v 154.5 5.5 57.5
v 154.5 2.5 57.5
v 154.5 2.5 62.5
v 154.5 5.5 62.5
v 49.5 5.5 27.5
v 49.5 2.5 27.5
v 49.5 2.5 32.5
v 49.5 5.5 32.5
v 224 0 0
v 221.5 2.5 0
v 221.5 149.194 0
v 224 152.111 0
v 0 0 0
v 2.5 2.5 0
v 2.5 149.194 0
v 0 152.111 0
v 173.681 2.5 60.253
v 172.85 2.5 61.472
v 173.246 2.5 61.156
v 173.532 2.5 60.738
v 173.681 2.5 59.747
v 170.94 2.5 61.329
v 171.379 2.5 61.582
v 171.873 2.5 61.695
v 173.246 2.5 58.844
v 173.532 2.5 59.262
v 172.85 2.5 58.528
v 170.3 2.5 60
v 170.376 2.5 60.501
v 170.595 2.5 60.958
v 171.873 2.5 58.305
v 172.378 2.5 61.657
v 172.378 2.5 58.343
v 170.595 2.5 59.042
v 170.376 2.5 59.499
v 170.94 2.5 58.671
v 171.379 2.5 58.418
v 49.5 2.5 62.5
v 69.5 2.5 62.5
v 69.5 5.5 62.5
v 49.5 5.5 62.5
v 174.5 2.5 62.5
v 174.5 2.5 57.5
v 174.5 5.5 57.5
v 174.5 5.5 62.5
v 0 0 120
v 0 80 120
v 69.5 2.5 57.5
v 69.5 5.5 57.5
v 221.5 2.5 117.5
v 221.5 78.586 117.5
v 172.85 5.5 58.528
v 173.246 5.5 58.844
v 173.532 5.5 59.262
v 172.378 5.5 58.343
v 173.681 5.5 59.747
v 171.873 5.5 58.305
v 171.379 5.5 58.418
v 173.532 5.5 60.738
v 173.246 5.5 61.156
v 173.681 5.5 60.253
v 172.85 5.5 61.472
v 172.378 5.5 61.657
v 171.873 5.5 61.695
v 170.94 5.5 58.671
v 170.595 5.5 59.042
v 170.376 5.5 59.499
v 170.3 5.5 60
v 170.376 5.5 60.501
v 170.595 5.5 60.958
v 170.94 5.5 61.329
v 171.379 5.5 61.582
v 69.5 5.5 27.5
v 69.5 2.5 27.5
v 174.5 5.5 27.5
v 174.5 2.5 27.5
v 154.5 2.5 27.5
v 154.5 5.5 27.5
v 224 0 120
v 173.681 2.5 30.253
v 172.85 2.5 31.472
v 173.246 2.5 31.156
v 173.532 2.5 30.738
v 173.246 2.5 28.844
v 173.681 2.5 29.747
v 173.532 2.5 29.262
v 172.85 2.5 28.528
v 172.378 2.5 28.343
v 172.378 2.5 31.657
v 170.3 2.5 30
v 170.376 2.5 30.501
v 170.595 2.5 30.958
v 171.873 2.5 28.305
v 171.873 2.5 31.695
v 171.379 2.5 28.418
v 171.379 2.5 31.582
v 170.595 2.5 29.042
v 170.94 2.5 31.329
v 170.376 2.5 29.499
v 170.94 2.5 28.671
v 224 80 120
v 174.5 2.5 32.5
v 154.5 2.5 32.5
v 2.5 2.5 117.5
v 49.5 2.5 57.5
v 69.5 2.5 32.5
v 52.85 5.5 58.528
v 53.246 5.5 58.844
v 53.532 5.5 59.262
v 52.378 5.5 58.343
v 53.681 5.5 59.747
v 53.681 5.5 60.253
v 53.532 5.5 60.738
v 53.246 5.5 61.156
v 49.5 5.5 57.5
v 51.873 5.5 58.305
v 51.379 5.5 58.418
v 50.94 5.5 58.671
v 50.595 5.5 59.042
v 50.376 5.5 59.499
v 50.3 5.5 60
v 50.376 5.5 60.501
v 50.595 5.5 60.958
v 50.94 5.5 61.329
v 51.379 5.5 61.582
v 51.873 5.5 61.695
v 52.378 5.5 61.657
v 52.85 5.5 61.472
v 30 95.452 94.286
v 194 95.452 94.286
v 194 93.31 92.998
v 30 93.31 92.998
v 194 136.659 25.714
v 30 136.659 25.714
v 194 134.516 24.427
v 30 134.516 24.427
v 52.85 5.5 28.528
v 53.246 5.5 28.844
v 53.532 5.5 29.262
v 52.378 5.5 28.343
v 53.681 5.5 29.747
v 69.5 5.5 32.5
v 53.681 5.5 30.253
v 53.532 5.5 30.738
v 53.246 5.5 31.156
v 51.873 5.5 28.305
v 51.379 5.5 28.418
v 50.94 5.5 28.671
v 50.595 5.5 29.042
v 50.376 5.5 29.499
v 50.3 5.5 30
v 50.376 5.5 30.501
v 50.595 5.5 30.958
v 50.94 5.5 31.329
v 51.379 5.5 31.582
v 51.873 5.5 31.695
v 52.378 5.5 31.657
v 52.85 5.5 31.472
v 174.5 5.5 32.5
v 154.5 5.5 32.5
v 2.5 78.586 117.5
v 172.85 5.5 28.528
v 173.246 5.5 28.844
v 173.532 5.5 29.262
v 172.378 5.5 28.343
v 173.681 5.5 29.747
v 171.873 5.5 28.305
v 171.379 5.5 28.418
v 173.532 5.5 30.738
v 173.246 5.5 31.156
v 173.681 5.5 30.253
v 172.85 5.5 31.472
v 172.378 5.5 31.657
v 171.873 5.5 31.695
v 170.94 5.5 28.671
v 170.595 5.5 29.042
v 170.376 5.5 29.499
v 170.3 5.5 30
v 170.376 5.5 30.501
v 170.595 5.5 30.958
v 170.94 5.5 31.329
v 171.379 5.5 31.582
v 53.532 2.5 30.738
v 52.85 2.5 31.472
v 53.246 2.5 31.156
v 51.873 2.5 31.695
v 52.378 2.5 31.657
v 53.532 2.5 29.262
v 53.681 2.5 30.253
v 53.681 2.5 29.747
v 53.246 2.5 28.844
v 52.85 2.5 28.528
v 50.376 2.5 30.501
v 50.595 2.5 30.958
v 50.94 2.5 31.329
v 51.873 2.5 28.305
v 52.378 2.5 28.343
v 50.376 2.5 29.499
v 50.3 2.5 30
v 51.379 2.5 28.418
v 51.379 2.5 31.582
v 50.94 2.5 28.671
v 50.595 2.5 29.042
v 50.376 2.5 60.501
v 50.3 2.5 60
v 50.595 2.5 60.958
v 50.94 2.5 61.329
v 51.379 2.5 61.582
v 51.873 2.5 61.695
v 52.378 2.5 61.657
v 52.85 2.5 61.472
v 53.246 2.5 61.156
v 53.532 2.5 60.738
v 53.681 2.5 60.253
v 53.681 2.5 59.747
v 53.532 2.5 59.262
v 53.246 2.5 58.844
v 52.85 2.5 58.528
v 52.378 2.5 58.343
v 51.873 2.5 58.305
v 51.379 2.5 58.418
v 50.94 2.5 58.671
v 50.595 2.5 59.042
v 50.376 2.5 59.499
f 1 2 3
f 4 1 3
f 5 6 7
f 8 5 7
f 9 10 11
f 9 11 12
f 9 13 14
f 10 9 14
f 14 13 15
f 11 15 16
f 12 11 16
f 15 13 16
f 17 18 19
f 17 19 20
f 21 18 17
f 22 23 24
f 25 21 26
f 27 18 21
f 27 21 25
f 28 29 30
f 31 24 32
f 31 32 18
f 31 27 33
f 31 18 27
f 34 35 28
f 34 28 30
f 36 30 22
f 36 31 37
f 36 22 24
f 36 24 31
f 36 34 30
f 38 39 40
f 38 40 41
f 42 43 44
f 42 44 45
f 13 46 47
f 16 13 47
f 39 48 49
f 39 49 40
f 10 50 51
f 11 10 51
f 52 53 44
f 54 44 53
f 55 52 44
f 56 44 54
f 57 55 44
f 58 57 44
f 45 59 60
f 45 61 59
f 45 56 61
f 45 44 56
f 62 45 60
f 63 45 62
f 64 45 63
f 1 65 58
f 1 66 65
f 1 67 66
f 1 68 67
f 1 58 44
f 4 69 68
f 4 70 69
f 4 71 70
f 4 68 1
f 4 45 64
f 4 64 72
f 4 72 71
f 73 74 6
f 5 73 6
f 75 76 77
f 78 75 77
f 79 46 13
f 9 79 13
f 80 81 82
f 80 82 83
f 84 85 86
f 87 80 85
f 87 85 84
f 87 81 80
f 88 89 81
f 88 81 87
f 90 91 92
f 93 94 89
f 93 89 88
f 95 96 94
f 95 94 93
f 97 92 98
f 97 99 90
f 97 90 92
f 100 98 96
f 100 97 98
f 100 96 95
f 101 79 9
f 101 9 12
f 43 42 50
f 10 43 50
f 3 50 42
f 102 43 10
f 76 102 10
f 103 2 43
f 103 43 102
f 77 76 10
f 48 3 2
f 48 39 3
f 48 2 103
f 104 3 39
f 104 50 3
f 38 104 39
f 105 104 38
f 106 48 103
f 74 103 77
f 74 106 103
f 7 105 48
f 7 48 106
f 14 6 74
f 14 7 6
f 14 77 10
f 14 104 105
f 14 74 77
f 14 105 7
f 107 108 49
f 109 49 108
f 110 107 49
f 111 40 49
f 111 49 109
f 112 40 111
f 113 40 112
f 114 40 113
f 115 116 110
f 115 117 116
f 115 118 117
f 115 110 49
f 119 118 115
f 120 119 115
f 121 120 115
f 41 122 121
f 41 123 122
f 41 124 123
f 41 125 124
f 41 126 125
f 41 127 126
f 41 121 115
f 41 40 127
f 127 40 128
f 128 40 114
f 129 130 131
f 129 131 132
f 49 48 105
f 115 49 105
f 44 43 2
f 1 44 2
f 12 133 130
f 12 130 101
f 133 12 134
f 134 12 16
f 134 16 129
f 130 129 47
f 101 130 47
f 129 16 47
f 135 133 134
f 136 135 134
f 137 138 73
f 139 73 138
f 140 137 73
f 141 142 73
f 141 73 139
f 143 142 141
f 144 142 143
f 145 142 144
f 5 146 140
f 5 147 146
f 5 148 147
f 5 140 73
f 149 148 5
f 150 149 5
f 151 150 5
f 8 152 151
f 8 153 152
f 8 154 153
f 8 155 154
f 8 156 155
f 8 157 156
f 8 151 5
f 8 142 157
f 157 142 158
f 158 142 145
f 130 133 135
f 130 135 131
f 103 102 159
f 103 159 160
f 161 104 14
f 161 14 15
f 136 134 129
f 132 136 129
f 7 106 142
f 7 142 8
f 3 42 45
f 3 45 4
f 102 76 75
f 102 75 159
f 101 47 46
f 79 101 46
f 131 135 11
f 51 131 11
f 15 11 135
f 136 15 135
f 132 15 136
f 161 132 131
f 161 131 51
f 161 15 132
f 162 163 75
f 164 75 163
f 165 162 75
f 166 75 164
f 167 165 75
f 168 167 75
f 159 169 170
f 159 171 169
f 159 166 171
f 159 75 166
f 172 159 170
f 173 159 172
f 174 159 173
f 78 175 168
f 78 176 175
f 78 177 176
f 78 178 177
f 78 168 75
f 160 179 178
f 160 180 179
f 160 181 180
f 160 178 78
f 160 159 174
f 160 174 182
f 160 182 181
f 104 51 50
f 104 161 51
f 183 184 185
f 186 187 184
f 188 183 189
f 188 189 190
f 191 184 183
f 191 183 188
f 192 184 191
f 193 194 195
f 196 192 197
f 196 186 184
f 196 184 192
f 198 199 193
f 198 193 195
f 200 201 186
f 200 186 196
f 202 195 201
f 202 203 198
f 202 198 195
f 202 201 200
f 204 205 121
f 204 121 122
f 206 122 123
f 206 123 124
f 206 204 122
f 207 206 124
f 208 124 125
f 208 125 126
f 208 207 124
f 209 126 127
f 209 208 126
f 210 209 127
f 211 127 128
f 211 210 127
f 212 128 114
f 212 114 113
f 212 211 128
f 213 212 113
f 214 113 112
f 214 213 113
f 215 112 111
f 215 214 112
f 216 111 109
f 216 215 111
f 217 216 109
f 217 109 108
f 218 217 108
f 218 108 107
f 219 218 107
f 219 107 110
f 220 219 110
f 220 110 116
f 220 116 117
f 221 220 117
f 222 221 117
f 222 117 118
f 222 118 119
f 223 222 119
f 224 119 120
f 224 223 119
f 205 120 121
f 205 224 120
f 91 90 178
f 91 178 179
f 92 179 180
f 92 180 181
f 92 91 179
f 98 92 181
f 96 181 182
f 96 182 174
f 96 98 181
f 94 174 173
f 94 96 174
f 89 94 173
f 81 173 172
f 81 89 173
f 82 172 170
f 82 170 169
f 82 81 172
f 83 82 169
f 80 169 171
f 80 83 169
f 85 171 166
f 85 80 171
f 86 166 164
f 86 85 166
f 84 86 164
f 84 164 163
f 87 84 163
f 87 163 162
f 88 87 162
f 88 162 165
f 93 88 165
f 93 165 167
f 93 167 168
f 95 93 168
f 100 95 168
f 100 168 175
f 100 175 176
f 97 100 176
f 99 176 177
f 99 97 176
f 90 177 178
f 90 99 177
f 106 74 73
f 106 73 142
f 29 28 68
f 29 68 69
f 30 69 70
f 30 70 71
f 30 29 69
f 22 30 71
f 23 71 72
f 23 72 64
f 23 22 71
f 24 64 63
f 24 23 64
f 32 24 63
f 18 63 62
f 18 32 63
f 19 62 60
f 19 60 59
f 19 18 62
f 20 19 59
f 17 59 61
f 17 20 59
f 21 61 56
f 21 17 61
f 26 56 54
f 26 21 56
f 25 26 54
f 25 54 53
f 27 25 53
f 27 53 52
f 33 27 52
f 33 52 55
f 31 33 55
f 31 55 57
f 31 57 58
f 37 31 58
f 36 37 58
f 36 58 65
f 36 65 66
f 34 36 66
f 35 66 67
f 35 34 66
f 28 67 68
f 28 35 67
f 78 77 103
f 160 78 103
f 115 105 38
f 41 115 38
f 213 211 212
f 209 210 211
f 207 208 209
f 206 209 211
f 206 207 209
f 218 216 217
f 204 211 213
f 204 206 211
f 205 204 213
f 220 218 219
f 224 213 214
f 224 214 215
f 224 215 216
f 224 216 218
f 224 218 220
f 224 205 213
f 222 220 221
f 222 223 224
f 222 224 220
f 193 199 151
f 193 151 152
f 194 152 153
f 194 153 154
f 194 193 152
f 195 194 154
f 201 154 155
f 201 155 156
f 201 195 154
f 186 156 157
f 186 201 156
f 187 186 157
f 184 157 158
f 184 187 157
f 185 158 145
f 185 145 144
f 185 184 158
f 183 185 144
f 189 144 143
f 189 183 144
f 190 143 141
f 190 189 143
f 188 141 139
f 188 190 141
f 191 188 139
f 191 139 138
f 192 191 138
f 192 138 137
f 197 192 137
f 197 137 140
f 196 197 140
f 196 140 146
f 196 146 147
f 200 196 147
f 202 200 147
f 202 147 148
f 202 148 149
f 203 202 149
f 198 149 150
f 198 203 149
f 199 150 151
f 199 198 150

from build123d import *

# Parameters (mm, degrees)
F1_DEPTH = 224
F2_T     = -2.5
F3_W     = 164
F3_H     = 80
F4_DEPTH = 6
F5_W     = 20
F5_H     = 5
F5_R     = 1.7
F6_DEPTH = 3


with BuildPart() as f1:
    # F0 (on Right) → F1 (new body)
    with BuildSketch(Plane.YZ):
        Polygon((0, 120), (0, 0), (152.1110255093, 0), (80, 120), align=None)
    extrude(amount=F1_DEPTH)

    # F2
    f2_openings = [f1.faces().sort_by_distance(p)[0] for p in [
        (112, 76.055513, 0),
    ]]
    offset(amount=F2_T, openings=f2_openings, kind=Kind.INTERSECTION)

    # F3 (on face) → F4 (cut)
    with BuildSketch(Plane(origin=(0, 111.7550391497, 67.1564206576), x_dir=(-1, 0, 0), z_dir=(0, 0.8571428571, 0.5150787536))):
        with Locations((-112, -8.3491574339)):
            Rectangle(F3_W, F3_H)
    extrude(amount=-F4_DEPTH, mode=Mode.SUBTRACT)

    # F5 (on face) → F6 (join)
    with BuildSketch(Plane(origin=(0, 2.5, 0), x_dir=(-1, 0, 0), z_dir=(0, 1, 0))):
        with Locations((-164.5, 30)):
            Rectangle(F5_W, F5_H)
        with Locations((-172, 30)):
            Circle(F5_R, mode=Mode.SUBTRACT)
        with Locations((-164.5, 60)):
            Rectangle(F5_W, F5_H)
        with Locations((-172, 60)):
            Circle(F5_R, mode=Mode.SUBTRACT)
        with Locations((-59.5, 30)):
            Rectangle(F5_W, F5_H)
        with Locations((-52, 30)):
            Circle(F5_R, mode=Mode.SUBTRACT)
        with Locations((-59.5, 60)):
            Rectangle(F5_W, F5_H)
        with Locations((-52, 60)):
            Circle(F5_R, mode=Mode.SUBTRACT)
    extrude(amount=F6_DEPTH)


solid = f1.part
